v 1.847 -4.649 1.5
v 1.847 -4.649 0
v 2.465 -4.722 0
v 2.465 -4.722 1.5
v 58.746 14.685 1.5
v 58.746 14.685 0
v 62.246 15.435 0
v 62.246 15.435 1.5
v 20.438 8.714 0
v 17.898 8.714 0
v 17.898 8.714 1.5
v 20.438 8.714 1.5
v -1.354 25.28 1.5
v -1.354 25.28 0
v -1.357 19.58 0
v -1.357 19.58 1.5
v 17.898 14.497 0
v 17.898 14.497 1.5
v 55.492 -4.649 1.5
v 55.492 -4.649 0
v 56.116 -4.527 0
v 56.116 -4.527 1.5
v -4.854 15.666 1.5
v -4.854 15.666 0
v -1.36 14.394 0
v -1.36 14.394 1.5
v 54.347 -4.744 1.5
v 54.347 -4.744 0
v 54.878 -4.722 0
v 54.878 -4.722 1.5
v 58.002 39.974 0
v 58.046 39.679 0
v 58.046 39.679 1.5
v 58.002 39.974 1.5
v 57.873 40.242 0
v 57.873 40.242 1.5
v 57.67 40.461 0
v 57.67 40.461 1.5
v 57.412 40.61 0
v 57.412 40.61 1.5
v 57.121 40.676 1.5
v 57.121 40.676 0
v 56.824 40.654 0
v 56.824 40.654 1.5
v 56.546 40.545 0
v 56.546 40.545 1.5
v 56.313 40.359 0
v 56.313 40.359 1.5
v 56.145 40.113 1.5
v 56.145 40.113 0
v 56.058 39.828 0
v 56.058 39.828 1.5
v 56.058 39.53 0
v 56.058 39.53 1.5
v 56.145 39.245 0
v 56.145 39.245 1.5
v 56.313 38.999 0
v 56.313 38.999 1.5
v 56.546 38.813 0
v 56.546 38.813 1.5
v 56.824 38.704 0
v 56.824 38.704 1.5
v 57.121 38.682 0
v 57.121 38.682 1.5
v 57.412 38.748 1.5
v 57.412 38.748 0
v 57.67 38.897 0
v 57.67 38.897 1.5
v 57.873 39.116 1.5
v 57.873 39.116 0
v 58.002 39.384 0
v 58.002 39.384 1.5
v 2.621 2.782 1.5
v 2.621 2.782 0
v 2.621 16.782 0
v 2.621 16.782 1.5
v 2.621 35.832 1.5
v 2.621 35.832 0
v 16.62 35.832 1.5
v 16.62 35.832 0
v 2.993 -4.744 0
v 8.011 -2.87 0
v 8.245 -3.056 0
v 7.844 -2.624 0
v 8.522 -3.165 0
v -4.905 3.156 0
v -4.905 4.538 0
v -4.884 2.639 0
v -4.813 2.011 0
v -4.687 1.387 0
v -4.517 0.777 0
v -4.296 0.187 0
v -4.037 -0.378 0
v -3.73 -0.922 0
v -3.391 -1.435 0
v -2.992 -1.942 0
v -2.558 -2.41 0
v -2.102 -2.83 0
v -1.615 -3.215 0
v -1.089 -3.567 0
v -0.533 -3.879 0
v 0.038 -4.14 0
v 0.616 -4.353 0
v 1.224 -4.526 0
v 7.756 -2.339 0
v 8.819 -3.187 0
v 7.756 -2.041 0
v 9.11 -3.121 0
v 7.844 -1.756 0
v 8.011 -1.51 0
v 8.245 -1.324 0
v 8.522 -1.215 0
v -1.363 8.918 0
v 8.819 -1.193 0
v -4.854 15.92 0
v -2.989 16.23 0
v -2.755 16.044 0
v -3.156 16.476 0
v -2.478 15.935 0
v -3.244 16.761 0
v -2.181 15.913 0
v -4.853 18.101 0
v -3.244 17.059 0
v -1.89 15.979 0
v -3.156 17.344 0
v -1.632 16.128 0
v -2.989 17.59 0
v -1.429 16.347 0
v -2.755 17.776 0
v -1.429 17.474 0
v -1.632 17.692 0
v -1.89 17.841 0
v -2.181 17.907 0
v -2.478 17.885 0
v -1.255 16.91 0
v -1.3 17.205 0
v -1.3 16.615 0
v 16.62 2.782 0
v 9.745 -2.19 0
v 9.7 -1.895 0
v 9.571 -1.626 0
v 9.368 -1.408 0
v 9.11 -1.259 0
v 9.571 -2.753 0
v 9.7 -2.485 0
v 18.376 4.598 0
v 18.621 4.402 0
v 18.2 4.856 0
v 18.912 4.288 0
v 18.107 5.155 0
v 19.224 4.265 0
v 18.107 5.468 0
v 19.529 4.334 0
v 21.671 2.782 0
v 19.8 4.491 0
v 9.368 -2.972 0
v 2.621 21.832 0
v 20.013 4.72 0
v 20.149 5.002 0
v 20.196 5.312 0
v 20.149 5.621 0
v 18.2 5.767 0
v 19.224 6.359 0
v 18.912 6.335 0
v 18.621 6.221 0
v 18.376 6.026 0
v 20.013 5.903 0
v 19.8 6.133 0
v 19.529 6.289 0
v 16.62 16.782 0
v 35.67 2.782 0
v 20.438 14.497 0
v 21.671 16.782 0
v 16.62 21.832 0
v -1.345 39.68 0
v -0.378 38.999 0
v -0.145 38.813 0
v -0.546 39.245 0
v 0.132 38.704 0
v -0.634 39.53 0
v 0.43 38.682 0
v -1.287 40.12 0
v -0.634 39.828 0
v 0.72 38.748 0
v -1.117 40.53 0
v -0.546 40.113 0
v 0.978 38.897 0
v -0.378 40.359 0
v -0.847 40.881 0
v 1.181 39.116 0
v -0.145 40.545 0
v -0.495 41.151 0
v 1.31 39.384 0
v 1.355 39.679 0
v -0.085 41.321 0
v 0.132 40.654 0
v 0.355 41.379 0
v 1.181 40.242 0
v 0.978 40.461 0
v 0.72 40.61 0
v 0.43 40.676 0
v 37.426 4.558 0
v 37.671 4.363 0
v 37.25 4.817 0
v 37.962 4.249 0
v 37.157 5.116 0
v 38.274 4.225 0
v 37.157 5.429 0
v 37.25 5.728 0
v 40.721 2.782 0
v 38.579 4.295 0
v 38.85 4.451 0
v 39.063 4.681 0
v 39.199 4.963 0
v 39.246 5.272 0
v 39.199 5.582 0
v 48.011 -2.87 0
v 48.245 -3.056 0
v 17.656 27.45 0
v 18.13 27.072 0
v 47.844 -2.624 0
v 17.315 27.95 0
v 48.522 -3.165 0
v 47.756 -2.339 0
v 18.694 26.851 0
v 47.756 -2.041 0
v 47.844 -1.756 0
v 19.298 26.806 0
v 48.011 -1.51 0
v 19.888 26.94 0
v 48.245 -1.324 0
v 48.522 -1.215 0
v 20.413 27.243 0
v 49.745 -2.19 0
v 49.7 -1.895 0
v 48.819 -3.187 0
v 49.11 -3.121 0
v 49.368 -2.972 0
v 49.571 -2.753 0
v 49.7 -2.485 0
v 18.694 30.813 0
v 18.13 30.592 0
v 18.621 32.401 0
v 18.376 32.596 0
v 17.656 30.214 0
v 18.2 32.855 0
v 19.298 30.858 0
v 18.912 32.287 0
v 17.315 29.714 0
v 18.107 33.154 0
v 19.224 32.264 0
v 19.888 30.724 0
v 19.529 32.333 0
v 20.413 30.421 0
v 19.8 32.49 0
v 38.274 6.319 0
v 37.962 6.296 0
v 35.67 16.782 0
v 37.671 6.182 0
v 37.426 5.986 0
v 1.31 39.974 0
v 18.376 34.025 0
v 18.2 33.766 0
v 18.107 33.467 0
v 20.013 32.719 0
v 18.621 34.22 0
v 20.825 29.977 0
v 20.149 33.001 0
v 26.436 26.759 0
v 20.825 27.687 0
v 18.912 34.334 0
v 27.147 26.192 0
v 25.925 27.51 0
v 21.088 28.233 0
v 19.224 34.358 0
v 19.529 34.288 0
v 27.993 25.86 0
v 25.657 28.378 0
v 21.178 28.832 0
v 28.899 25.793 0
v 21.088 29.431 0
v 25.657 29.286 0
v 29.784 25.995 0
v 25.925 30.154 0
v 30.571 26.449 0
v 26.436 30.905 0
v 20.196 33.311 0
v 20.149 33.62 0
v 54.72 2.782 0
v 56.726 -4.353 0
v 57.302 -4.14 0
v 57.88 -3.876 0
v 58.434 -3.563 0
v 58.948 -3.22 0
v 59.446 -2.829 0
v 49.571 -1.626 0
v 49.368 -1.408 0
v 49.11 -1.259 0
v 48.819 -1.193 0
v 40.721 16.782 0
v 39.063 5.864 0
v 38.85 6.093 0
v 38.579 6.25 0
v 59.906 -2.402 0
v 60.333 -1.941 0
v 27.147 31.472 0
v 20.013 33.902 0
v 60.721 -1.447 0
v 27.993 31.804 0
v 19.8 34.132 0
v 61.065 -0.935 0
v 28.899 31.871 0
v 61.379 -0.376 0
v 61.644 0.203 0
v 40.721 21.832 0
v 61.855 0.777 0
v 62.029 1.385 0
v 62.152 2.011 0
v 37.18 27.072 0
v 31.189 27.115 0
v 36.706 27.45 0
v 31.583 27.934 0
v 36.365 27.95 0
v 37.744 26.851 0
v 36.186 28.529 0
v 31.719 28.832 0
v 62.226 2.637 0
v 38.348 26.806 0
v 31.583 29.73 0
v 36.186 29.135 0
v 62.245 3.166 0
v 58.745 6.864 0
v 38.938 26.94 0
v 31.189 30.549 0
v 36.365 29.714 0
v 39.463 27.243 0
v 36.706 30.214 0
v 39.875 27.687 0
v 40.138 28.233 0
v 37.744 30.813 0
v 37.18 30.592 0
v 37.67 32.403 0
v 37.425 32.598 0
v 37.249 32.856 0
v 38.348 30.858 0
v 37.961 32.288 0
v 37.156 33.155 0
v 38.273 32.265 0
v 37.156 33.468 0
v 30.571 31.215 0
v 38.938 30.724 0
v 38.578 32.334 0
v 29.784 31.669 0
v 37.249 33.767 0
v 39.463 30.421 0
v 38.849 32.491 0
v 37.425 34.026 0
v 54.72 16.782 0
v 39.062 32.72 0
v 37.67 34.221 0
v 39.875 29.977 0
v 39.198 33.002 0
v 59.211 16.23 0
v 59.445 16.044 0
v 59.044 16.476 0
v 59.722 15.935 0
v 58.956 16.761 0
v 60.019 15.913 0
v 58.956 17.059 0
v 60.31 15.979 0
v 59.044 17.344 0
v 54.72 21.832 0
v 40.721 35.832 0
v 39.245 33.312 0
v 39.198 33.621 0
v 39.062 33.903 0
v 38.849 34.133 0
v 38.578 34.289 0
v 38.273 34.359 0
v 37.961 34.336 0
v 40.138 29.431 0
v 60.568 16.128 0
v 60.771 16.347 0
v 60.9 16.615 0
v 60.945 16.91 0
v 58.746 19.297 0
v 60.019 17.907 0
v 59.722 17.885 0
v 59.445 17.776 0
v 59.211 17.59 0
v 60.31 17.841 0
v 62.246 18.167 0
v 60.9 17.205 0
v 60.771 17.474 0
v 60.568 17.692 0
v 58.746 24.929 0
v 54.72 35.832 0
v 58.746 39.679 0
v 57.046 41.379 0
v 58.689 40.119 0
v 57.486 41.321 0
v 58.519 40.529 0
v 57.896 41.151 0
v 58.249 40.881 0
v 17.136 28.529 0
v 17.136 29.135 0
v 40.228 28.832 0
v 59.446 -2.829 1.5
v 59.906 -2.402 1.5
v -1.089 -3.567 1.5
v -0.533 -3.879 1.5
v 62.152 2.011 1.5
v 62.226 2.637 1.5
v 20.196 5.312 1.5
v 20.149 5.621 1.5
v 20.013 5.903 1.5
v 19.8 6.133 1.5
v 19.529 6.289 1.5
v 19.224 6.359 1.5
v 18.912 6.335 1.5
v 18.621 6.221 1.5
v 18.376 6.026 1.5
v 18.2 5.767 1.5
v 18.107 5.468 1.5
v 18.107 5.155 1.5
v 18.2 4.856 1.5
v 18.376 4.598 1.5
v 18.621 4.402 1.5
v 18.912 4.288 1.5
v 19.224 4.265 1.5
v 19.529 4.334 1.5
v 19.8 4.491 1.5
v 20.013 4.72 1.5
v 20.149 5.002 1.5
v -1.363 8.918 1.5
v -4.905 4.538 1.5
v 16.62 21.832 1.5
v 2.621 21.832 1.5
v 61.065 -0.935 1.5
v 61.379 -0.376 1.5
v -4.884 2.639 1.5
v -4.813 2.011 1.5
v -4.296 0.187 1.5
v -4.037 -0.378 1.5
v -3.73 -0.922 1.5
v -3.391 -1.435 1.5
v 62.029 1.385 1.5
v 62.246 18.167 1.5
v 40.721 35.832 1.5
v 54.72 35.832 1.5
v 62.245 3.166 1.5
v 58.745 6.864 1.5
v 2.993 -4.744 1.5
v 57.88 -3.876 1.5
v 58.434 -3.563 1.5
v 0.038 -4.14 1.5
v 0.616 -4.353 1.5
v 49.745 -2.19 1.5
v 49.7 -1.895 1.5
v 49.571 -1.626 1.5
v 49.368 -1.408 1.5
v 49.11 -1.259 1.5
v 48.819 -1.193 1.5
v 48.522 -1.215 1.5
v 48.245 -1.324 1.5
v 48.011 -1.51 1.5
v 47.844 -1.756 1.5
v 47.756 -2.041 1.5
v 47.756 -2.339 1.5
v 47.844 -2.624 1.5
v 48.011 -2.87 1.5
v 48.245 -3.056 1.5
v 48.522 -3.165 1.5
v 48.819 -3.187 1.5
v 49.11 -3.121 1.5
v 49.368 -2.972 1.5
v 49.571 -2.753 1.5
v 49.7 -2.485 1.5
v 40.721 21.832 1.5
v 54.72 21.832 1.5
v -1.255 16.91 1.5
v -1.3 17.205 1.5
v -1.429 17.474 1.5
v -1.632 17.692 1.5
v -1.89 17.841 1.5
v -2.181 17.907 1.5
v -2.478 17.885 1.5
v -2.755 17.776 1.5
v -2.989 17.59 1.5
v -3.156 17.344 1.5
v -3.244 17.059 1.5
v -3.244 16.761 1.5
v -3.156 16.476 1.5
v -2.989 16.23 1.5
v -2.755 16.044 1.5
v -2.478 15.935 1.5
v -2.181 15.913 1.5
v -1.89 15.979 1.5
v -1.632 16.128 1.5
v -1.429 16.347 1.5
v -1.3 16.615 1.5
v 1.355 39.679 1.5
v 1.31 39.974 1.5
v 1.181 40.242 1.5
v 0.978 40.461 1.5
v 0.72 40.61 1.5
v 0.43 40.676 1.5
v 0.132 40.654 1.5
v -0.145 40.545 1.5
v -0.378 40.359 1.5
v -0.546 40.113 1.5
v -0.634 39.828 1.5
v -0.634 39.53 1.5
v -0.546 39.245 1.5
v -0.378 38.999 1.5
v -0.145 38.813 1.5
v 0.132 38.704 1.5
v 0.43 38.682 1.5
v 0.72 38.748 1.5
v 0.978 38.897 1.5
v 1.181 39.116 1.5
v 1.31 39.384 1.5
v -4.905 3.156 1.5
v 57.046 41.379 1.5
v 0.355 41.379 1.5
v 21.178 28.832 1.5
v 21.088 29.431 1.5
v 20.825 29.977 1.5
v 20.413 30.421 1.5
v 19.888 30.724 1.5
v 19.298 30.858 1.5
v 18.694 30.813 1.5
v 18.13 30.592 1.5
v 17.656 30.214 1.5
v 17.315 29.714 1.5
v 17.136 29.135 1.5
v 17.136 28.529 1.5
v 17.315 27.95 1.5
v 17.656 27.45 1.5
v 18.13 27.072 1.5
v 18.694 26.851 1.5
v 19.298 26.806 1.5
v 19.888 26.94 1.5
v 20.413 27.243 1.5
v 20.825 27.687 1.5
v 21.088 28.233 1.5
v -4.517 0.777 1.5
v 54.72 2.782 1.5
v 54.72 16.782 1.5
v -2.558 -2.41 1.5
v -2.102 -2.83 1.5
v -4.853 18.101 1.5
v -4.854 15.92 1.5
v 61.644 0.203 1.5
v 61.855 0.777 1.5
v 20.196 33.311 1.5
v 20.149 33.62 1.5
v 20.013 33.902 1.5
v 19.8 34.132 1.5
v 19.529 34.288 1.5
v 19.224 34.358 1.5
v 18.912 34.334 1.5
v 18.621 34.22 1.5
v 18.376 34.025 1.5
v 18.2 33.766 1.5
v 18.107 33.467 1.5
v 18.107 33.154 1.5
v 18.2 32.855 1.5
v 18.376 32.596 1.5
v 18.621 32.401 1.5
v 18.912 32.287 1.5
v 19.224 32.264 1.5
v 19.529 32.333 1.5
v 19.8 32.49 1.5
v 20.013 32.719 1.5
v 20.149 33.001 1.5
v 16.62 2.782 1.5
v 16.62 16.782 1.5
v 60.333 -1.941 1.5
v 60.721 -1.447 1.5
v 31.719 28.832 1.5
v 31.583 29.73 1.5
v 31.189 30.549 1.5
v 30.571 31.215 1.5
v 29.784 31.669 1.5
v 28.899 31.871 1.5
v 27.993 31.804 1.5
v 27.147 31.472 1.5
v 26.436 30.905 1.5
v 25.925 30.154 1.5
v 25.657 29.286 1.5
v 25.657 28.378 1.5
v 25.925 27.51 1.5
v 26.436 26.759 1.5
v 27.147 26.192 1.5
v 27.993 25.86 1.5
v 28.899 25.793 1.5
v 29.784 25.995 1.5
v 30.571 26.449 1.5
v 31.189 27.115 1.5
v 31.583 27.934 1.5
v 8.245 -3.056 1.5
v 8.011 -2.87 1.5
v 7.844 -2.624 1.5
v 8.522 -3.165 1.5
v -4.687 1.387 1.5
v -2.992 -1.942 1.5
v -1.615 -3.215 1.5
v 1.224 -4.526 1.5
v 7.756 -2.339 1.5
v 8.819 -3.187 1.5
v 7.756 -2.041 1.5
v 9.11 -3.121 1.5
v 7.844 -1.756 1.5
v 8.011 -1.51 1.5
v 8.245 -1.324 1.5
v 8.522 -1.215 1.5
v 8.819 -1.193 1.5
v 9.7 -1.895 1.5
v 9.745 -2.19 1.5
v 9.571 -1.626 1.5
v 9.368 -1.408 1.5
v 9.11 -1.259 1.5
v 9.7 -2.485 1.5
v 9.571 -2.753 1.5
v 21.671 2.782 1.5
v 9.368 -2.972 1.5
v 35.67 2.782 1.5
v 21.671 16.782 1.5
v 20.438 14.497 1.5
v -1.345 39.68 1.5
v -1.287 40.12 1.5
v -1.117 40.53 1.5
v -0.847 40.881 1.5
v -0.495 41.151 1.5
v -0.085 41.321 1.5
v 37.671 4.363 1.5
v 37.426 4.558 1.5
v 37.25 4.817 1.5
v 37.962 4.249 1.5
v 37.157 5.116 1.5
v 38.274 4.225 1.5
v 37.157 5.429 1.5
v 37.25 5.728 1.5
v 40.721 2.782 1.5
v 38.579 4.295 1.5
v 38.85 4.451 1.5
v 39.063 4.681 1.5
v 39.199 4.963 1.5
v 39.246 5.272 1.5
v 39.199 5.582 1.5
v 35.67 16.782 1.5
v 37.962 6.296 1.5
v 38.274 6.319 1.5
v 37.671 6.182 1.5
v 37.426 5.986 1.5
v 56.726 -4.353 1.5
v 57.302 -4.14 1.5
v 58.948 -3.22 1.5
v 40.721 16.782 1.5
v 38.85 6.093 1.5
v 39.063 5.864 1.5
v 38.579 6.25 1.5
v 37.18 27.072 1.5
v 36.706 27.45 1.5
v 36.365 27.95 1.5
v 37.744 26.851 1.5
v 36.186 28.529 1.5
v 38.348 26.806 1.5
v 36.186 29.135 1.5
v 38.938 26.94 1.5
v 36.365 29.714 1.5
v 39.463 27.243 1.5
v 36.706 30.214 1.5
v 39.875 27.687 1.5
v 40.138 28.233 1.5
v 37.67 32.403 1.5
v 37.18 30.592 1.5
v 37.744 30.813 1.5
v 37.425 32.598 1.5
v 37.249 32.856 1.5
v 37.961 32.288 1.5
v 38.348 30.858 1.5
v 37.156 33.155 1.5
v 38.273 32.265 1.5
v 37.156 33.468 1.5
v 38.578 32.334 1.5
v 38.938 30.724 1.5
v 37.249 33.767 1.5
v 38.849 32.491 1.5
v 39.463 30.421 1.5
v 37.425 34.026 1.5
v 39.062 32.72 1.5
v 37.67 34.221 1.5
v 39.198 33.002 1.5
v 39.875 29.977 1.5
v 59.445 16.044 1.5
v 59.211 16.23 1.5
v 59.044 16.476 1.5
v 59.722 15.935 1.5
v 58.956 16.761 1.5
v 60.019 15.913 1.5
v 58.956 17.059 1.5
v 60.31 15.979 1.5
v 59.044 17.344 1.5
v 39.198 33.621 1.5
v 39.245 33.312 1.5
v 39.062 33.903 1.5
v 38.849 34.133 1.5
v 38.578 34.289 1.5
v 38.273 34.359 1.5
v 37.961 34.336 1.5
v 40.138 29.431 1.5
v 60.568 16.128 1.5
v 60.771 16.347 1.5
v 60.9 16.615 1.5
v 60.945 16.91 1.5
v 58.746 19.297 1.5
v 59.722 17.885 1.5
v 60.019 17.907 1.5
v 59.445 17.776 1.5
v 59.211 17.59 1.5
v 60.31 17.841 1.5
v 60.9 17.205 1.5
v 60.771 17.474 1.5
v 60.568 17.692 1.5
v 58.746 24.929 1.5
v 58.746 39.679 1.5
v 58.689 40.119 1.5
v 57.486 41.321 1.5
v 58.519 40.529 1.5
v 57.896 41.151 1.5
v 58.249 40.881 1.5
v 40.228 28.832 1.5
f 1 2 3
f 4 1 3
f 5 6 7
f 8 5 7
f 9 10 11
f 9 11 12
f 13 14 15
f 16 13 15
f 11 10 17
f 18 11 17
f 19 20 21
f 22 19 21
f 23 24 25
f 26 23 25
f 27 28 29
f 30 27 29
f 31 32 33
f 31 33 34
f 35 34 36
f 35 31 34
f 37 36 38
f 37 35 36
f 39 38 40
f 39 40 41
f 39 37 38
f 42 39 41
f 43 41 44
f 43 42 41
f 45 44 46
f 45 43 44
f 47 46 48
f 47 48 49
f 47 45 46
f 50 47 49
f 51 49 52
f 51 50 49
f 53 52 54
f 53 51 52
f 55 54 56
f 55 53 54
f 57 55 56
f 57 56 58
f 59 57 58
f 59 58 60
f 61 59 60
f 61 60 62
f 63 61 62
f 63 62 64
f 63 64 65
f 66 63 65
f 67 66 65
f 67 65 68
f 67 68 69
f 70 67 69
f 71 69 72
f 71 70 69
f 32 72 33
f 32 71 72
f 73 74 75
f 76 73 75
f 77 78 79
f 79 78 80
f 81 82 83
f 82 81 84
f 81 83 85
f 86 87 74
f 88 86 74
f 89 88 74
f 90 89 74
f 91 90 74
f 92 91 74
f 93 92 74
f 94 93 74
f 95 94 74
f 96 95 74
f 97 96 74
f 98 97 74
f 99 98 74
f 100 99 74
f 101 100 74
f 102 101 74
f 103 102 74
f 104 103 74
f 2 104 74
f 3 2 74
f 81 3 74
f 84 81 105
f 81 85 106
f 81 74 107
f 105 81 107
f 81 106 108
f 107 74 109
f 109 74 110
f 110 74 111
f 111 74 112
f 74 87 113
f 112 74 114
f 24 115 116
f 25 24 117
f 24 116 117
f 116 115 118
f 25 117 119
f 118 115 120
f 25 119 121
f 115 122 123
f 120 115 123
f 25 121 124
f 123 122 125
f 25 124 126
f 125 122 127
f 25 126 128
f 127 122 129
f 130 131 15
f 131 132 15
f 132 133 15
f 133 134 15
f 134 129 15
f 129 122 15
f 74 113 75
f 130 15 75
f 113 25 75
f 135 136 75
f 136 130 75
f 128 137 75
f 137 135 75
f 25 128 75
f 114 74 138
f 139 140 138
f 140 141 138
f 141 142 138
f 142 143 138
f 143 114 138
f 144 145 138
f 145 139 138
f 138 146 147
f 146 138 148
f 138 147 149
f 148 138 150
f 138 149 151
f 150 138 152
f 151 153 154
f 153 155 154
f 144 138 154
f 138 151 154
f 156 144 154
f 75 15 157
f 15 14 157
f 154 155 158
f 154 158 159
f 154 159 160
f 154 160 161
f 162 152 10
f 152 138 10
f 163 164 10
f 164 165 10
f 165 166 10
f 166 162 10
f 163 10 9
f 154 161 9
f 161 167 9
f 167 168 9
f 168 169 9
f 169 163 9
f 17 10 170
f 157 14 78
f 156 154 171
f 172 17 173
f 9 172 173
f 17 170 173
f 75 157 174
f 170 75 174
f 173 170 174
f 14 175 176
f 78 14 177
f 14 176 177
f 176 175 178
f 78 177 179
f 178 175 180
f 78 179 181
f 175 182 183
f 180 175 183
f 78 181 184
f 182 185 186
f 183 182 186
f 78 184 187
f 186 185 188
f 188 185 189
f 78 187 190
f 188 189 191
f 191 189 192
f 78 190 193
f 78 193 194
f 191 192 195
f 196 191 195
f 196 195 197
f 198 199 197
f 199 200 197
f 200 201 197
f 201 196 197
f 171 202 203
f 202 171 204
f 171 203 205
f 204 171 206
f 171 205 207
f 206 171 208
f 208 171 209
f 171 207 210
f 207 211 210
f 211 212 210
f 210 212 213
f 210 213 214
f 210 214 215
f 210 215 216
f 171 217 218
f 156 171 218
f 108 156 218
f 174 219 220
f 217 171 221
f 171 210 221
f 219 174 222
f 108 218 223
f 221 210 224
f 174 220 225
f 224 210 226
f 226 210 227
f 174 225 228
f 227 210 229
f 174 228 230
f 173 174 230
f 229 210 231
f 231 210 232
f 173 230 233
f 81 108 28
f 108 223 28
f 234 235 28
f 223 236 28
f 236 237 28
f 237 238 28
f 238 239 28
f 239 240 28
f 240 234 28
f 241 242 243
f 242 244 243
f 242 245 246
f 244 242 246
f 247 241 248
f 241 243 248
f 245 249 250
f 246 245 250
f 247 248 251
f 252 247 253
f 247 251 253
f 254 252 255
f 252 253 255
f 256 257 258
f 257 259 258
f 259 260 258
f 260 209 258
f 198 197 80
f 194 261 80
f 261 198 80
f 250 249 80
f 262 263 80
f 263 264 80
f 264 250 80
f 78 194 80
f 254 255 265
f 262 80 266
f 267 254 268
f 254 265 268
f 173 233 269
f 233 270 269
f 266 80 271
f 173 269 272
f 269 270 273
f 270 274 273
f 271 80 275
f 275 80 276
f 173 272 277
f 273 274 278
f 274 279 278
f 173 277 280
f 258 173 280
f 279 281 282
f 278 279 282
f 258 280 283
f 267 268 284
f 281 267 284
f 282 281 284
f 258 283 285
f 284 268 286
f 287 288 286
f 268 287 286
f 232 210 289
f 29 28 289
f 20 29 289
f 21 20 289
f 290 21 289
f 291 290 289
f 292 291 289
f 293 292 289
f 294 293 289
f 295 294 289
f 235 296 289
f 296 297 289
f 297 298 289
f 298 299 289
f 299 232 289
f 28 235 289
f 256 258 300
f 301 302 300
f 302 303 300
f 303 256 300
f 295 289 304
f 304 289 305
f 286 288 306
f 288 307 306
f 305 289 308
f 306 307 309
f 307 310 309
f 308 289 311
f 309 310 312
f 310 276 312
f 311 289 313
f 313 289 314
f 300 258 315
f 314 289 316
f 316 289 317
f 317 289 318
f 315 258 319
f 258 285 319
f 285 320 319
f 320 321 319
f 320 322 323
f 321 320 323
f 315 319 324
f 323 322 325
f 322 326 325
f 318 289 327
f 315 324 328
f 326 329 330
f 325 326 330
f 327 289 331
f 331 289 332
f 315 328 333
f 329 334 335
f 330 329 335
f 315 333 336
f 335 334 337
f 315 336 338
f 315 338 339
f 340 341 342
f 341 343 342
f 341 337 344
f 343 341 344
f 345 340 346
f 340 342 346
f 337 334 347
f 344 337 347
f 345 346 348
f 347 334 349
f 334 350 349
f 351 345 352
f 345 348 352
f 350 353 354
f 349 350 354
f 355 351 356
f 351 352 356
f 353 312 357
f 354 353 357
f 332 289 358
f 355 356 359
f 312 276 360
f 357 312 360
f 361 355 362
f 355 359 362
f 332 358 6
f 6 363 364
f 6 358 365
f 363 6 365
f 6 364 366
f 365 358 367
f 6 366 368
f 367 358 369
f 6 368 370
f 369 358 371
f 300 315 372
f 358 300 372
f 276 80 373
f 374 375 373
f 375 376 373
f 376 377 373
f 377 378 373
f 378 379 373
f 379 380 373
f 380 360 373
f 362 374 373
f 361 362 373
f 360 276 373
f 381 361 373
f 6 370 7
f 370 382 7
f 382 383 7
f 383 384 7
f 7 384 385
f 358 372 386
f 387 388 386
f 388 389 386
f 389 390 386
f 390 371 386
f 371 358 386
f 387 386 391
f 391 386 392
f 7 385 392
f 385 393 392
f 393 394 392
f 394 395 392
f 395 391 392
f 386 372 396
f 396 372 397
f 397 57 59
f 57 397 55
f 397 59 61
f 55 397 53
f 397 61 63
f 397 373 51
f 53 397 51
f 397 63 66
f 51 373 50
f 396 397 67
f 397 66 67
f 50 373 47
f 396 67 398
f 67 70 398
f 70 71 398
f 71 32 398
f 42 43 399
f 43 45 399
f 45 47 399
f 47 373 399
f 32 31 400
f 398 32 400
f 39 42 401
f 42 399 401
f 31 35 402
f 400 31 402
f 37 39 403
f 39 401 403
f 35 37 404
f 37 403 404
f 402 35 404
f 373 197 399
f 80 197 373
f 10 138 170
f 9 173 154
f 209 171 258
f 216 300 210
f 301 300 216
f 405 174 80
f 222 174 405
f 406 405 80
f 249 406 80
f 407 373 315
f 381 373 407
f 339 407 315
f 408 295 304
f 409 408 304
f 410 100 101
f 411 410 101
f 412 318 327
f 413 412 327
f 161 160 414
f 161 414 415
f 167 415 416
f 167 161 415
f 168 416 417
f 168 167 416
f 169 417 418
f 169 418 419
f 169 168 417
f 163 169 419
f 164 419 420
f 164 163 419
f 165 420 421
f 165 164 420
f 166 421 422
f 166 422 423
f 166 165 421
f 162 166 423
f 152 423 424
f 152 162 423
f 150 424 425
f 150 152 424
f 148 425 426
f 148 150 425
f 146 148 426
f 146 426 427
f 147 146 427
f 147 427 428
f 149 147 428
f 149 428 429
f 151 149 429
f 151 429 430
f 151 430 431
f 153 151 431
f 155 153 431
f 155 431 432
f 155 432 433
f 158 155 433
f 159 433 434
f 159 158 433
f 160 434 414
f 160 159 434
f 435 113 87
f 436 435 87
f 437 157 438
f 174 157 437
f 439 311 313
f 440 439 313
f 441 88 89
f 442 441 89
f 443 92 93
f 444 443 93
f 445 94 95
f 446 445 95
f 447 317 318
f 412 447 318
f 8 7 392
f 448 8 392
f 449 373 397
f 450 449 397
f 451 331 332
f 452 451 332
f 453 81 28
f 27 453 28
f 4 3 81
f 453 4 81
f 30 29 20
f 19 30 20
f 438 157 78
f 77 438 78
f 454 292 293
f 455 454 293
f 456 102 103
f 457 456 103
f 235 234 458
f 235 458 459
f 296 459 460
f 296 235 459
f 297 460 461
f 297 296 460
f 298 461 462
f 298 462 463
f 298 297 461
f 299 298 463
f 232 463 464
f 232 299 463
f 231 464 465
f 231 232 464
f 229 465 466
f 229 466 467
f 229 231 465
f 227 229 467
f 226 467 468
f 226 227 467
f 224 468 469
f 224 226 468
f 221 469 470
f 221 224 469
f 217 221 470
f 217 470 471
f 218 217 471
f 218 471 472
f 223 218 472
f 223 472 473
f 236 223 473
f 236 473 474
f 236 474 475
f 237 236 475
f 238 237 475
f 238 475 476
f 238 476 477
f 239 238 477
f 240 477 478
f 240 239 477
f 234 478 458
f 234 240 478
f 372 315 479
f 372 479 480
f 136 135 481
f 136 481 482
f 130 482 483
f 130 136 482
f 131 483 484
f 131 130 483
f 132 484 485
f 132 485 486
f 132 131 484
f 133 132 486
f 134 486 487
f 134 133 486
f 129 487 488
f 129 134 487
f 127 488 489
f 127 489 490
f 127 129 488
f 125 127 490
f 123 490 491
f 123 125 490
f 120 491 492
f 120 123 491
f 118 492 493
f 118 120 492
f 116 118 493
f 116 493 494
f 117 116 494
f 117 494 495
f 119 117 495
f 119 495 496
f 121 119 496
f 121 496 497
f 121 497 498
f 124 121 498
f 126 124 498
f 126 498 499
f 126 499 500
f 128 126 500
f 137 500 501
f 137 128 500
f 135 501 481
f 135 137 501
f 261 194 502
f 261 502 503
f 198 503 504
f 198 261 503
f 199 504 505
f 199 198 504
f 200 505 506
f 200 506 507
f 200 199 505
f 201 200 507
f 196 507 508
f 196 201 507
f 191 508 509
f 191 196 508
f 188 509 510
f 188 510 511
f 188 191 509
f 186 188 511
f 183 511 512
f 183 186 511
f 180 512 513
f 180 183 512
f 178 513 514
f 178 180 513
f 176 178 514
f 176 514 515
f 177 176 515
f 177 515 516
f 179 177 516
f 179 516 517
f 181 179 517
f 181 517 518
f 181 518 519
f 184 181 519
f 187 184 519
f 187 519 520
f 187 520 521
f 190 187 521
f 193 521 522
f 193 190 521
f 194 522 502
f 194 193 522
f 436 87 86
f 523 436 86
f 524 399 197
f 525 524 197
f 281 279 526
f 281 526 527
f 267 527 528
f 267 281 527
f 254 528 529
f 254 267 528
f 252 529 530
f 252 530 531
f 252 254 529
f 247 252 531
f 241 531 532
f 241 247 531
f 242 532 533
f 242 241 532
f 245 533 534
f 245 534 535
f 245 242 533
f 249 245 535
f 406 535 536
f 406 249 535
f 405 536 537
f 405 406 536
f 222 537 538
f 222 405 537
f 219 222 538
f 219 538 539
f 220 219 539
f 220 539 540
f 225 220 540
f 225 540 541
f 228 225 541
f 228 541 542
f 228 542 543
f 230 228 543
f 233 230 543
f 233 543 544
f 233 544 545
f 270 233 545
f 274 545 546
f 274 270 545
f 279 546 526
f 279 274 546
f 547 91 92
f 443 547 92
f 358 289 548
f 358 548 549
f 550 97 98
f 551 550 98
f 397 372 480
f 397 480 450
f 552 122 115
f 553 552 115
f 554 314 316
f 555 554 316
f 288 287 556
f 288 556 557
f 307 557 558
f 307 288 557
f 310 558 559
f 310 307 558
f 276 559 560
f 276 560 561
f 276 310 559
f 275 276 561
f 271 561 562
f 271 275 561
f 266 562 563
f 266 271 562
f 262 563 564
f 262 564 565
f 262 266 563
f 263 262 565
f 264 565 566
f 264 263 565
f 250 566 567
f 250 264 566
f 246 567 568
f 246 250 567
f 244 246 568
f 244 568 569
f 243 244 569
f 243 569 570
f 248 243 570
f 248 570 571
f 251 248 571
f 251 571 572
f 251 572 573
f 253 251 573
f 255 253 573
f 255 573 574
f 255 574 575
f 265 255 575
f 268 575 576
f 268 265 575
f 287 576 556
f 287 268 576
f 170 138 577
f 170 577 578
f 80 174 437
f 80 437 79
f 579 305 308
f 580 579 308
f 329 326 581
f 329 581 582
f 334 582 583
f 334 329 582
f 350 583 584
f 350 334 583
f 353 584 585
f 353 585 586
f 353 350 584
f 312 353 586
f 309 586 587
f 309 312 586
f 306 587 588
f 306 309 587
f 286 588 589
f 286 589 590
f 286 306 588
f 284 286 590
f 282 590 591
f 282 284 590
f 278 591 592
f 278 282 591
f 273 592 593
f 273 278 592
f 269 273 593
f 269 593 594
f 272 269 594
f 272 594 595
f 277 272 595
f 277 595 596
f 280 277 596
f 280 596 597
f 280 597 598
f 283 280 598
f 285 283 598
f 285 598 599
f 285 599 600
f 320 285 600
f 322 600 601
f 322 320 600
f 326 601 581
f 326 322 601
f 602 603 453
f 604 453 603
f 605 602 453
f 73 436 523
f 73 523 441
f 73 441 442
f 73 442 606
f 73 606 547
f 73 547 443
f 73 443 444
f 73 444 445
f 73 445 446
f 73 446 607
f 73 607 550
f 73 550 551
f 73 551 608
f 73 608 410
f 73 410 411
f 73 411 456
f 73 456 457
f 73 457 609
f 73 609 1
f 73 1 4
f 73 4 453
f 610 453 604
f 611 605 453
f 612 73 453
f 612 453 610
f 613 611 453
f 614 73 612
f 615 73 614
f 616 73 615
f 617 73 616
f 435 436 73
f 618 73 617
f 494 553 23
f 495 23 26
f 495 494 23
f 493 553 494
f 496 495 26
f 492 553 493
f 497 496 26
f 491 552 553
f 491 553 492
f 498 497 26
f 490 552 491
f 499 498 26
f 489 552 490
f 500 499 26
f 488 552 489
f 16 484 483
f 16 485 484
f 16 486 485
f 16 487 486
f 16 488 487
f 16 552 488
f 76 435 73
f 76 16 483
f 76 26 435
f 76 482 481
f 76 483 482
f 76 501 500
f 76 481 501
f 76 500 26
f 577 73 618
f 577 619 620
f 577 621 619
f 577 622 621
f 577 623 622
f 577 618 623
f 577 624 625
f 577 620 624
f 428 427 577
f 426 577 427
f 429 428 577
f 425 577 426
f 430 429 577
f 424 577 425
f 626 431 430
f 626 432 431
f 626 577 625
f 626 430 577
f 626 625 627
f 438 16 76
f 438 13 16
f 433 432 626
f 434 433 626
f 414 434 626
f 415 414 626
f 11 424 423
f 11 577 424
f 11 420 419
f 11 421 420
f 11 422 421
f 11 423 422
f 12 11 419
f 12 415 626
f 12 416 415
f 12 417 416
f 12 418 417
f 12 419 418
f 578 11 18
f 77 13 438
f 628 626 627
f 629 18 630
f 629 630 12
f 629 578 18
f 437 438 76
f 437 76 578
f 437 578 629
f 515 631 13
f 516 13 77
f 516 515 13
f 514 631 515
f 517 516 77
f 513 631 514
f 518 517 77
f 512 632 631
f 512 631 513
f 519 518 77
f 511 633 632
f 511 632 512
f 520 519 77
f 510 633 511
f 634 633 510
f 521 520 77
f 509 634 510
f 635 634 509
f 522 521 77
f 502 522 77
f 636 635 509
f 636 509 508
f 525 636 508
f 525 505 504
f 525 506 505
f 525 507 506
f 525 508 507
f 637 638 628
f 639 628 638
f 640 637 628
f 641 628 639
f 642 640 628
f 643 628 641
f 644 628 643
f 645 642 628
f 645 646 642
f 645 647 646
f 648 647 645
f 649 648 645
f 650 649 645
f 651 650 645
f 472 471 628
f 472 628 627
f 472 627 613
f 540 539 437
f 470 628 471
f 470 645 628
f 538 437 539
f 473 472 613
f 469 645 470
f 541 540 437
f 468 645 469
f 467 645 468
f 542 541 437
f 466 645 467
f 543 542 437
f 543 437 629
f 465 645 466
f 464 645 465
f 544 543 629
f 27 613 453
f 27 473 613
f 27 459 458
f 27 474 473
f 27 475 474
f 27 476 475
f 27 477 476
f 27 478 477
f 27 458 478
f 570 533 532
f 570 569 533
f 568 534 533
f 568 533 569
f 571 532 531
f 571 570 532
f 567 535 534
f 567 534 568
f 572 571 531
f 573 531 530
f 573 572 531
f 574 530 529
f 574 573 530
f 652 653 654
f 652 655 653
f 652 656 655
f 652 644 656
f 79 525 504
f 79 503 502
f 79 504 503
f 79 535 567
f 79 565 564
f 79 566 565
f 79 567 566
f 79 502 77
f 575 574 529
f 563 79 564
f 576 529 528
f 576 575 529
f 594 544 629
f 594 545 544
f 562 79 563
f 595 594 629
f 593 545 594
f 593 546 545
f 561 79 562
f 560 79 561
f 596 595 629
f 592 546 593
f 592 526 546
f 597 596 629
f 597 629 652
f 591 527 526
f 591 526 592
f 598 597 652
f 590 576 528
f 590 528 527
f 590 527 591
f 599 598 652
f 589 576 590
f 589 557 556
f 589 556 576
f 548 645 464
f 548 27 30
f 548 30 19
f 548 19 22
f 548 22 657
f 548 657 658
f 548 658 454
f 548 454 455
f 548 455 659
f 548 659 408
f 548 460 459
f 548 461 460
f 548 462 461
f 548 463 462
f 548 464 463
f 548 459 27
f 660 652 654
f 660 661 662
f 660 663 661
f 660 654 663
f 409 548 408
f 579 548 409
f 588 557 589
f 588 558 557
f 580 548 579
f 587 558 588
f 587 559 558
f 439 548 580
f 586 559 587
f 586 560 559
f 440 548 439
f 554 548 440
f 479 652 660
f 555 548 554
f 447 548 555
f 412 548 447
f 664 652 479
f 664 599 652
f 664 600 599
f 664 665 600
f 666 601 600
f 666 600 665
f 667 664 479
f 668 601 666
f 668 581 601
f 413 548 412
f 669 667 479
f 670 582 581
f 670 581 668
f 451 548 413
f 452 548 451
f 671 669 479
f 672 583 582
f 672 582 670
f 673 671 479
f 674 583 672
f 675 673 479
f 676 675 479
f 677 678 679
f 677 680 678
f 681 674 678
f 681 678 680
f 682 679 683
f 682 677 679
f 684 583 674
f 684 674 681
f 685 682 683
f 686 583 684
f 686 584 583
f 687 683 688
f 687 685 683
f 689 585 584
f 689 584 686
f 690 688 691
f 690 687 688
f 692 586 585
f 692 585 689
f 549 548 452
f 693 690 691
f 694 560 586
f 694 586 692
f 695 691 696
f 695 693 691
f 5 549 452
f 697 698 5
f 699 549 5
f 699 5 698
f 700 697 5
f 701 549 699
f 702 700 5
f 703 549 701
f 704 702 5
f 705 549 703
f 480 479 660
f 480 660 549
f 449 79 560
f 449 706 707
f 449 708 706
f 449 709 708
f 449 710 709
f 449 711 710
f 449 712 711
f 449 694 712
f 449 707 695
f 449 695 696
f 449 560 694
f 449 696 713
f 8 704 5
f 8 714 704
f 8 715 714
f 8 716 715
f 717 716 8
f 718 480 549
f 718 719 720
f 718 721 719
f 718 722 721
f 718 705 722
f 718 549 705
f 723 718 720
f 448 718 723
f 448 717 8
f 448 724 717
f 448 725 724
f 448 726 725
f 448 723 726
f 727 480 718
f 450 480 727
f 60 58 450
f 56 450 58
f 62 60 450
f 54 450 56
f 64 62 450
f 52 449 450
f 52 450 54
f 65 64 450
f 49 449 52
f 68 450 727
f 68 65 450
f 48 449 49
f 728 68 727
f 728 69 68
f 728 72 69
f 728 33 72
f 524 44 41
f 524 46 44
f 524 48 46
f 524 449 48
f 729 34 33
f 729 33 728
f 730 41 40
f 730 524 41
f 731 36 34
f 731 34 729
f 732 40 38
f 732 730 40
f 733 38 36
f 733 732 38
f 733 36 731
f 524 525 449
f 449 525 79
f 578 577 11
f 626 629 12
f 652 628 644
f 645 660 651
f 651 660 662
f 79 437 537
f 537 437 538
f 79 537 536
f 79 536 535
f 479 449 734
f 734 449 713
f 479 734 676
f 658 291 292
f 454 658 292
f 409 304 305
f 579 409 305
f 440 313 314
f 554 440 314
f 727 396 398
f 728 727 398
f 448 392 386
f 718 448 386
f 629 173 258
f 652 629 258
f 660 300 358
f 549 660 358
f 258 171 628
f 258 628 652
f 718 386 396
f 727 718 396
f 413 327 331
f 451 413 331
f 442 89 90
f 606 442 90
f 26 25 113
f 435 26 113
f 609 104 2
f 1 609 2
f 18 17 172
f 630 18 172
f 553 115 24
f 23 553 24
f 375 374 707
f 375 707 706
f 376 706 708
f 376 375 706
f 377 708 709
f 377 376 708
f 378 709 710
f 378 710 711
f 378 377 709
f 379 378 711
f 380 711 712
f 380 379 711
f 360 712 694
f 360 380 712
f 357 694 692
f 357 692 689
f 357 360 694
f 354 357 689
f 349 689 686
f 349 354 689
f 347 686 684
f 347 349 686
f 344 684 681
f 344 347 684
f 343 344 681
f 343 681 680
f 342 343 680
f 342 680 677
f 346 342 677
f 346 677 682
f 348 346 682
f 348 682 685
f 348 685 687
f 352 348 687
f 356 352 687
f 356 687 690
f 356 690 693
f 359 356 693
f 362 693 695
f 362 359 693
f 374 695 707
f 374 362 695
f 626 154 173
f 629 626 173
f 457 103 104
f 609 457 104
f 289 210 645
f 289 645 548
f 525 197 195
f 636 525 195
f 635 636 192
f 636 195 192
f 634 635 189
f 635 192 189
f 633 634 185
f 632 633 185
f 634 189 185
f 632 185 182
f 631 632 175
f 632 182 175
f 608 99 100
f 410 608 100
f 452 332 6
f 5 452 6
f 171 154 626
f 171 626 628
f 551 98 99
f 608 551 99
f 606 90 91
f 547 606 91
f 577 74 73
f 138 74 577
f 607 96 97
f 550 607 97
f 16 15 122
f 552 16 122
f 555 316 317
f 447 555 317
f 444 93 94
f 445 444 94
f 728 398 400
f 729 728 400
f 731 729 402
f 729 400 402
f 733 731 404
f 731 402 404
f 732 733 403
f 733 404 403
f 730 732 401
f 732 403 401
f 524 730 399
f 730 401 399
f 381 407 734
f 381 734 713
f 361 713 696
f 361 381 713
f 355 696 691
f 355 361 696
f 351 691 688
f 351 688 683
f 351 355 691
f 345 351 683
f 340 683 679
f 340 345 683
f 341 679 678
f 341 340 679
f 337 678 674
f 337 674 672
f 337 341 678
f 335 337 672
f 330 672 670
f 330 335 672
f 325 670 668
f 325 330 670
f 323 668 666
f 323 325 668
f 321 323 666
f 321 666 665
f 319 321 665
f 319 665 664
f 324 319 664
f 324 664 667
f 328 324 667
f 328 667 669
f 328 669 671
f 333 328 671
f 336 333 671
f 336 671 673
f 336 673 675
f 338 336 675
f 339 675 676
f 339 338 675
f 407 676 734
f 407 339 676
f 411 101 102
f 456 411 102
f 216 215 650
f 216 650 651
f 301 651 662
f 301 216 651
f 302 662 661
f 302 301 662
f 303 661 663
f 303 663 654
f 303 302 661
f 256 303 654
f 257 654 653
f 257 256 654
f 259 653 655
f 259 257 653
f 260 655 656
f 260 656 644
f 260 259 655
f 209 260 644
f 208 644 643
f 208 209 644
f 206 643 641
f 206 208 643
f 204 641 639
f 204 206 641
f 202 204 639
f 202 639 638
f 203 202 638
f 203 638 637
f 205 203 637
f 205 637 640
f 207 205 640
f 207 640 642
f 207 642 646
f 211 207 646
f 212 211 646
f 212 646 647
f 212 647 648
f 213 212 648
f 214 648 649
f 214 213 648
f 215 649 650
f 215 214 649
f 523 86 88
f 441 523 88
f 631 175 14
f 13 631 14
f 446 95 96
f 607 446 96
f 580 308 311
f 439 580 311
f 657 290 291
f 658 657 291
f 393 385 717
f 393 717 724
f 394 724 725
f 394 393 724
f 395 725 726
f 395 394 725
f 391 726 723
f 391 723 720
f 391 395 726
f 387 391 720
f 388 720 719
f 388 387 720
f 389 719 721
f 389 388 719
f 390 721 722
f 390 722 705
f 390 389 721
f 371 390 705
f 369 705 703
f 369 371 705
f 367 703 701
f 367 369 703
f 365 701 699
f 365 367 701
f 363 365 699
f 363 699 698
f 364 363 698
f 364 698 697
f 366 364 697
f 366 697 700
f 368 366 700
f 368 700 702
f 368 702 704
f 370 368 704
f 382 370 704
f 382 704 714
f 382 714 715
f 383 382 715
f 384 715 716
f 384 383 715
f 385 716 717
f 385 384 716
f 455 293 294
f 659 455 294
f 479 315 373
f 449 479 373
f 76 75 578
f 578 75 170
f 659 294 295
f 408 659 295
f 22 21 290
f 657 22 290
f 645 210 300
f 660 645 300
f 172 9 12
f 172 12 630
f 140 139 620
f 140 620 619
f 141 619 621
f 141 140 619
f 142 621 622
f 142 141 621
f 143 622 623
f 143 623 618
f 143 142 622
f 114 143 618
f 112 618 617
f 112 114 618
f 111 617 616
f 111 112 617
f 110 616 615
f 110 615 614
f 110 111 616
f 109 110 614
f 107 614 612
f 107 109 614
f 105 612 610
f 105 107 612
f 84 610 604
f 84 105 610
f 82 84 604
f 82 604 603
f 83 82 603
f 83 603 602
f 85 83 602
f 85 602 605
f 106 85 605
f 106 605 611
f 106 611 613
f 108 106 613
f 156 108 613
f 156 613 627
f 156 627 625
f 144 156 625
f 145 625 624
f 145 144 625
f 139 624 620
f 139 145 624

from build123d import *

# Parameters (mm, degrees)
MODEL_R         = 1
MODEL_R_2       = 1.05
MODEL_W         = 13.99947
MODEL_H         = 13.99944
MODEL_W_2       = 2.54
MODEL_H_2       = 5.78308735
MODEL_W_3       = 13.9994
MODEL_W_4       = 13.9993
MODEL_H_3       = 13.9993
MODEL_R_3       = 2.032
MODEL_R_4       = 3.048
EXTRUDE_1_DEPTH = 1.5


with BuildPart() as part:
    # Model → 凸台-拉伸1 (new body)
    with BuildSketch(Plane.XY):
        with BuildLine():
            Line((57.046434605, 41.37894176), (0.354810268, 41.37894176))
            ThreePointArc((0.354810268, 41.37894176), (-0.846923686, 40.881370762), (-1.345189448, 39.679924707))
            Line((-1.345189448, 39.679924707), (-1.353515518, 25.280051374))
            Line((-1.353515518, 25.280051374), (-1.356811329, 19.579970423))
            Line((-1.356811329, 19.579970423), (-4.853485523, 18.100805857))
            Line((-4.853485523, 18.100805857), (-4.853710523, 15.920120221))
            Line((-4.853710523, 15.920120221), (-4.853736766, 15.66577888))
            Line((-4.853736766, 15.66577888), (-1.359820188, 14.394107598))
            Line((-1.359820188, 14.394107598), (-1.362991715, 8.917997305))
            Line((-1.362991715, 8.917997305), (-4.9049154, 4.538497879))
            Line((-4.9049154, 4.538497879), (-4.9049154, 3.15597541))
            Line((-4.9049154, 3.15597541), (-4.883883595, 2.639206616))
            Line((-4.883883595, 2.639206616), (-4.813264805, 2.011073476))
            Line((-4.813264805, 2.011073476), (-4.687062167, 1.387481119))
            Line((-4.687062167, 1.387481119), (-4.516803943, 0.776764684))
            Line((-4.516803943, 0.776764684), (-4.295659415, 0.187060206))
            Line((-4.295659415, 0.187060206), (-4.03681533, -0.378036856))
            Line((-4.03681533, -0.378036856), (-3.730362364, -0.921623746))
            Line((-3.730362364, -0.921623746), (-3.390574278, -1.434889052))
            Line((-3.390574278, -1.434889052), (-2.992281832, -1.942165148))
            Line((-2.992281832, -1.942165148), (-2.558331876, -2.409802006))
            Line((-2.558331876, -2.409802006), (-2.102251702, -2.829663369))
            Line((-2.102251702, -2.829663369), (-1.614610519, -3.215411153))
            Line((-1.614610519, -3.215411153), (-1.088890304, -3.567123565))
            Line((-1.088890304, -3.567123565), (-0.532800957, -3.878547051))
            Line((-0.532800957, -3.878547051), (0.038326794, -4.140153507))
            Line((0.038326794, -4.140153507), (0.615600502, -4.353028424))
            Line((0.615600502, -4.353028424), (1.223529929, -4.526191258))
            Line((1.223529929, -4.526191258), (1.847223482, -4.64943937))
            Line((1.847223482, -4.64943937), (2.464503115, -4.722060038))
            Line((2.464503115, -4.722060038), (2.992774524, -4.743685))
            Line((2.992774524, -4.743685), (54.34686609, -4.743685))
            Line((54.34686609, -4.743685), (54.87843401, -4.722059086))
            Line((54.87843401, -4.722059086), (55.492240411, -4.649391053))
            Line((55.492240411, -4.649391053), (56.11599848, -4.526806688))
            Line((56.11599848, -4.526806688), (56.726168878, -4.352867841))
            Line((56.726168878, -4.352867841), (57.302144081, -4.140491025))
            Line((57.302144081, -4.140491025), (57.880206411, -3.875955859))
            Line((57.880206411, -3.875955859), (58.434482529, -3.563431063))
            Line((58.434482529, -3.563431063), (58.947571314, -3.220379587))
            Line((58.947571314, -3.220379587), (59.445938304, -2.8287768))
            Line((59.445938304, -2.8287768), (59.905767444, -2.401934126))
            Line((59.905767444, -2.401934126), (60.332973054, -1.941418241))
            Line((60.332973054, -1.941418241), (60.721224007, -1.446690794))
            Line((60.721224007, -1.446690794), (61.064717919, -0.934798534))
            Line((61.064717919, -0.934798534), (61.379380282, -0.376374826))
            Line((61.379380282, -0.376374826), (61.644240363, 0.202684675))
            Line((61.644240363, 0.202684675), (61.855333273, 0.776565869))
            Line((61.855333273, 0.776565869), (62.029241049, 1.384922025))
            Line((62.029241049, 1.384922025), (62.152356641, 2.011350393))
            Line((62.152356641, 2.011350393), (62.226202972, 2.636734827))
            Line((62.226202972, 2.636734827), (62.245297192, 3.166071528))
            Line((62.245297192, 3.166071528), (58.745412398, 6.86443549))
            Line((58.745412398, 6.86443549), (58.74568075, 14.685402523))
            Line((58.74568075, 14.685402523), (62.245579127, 15.434705638))
            Line((62.245579127, 15.434705638), (62.245861062, 18.167199282))
            Line((62.245861062, 18.167199282), (58.745799684, 19.296928449))
            Line((58.745799684, 19.296928449), (58.745975132, 24.929084585))
            Line((58.745975132, 24.929084585), (58.746434604, 39.678888803))
            ThreePointArc((58.746434604, 39.678888803), (58.248534856, 40.881004565), (57.046434605, 41.37894176))
        make_face()
        with Locations((8.744501265, -2.189788582)):
            Circle(MODEL_R, mode=Mode.SUBTRACT)
        with Locations((19.14575, 5.311768186)):
            Circle(MODEL_R_2, mode=Mode.SUBTRACT)
        with Locations((9.620765, 9.78198)):
            Rectangle(MODEL_W, MODEL_H, mode=Mode.SUBTRACT)
        with Locations((-2.255498735, 16.910211418)):
            Circle(MODEL_R, mode=Mode.SUBTRACT)
        with Locations((19.167580955, 11.605191102)):
            Rectangle(MODEL_W_2, MODEL_H_2, mode=Mode.SUBTRACT)
        with Locations((38.19575, 5.272237591)):
            Circle(MODEL_R_2, mode=Mode.SUBTRACT)
        with Locations((48.744501265, -2.189788582)):
            Circle(MODEL_R, mode=Mode.SUBTRACT)
        with Locations((28.6707, 9.78198)):
            Rectangle(MODEL_W_3, MODEL_H, mode=Mode.SUBTRACT)
        with Locations((47.72075, 9.78198)):
            Rectangle(MODEL_W_4, MODEL_H, mode=Mode.SUBTRACT)
        with Locations((59.944501265, 16.910211418)):
            Circle(MODEL_R, mode=Mode.SUBTRACT)
        with Locations((9.620765, 28.83195)):
            Rectangle(MODEL_W, MODEL_H_3, mode=Mode.SUBTRACT)
        with Locations((19.1458, 28.832)):
            Circle(MODEL_R_3, mode=Mode.SUBTRACT)
        with Locations((0.354810268, 39.67894176)):
            Circle(MODEL_R, mode=Mode.SUBTRACT)
        with Locations((19.14575, 33.310608186)):
            Circle(MODEL_R_2, mode=Mode.SUBTRACT)
        with Locations((28.6708, 28.832)):
            Circle(MODEL_R_4, mode=Mode.SUBTRACT)
        with Locations((38.1958, 28.832)):
            Circle(MODEL_R_3, mode=Mode.SUBTRACT)
        with Locations((47.72075, 28.83195)):
            Rectangle(MODEL_W_4, MODEL_H_3, mode=Mode.SUBTRACT)
        with Locations((38.194579287, 33.311869349)):
            Circle(MODEL_R_2, mode=Mode.SUBTRACT)
        with Locations((57.046434605, 39.67894176)):
            Circle(MODEL_R, mode=Mode.SUBTRACT)
    extrude(amount=EXTRUDE_1_DEPTH)


solid = part.part
